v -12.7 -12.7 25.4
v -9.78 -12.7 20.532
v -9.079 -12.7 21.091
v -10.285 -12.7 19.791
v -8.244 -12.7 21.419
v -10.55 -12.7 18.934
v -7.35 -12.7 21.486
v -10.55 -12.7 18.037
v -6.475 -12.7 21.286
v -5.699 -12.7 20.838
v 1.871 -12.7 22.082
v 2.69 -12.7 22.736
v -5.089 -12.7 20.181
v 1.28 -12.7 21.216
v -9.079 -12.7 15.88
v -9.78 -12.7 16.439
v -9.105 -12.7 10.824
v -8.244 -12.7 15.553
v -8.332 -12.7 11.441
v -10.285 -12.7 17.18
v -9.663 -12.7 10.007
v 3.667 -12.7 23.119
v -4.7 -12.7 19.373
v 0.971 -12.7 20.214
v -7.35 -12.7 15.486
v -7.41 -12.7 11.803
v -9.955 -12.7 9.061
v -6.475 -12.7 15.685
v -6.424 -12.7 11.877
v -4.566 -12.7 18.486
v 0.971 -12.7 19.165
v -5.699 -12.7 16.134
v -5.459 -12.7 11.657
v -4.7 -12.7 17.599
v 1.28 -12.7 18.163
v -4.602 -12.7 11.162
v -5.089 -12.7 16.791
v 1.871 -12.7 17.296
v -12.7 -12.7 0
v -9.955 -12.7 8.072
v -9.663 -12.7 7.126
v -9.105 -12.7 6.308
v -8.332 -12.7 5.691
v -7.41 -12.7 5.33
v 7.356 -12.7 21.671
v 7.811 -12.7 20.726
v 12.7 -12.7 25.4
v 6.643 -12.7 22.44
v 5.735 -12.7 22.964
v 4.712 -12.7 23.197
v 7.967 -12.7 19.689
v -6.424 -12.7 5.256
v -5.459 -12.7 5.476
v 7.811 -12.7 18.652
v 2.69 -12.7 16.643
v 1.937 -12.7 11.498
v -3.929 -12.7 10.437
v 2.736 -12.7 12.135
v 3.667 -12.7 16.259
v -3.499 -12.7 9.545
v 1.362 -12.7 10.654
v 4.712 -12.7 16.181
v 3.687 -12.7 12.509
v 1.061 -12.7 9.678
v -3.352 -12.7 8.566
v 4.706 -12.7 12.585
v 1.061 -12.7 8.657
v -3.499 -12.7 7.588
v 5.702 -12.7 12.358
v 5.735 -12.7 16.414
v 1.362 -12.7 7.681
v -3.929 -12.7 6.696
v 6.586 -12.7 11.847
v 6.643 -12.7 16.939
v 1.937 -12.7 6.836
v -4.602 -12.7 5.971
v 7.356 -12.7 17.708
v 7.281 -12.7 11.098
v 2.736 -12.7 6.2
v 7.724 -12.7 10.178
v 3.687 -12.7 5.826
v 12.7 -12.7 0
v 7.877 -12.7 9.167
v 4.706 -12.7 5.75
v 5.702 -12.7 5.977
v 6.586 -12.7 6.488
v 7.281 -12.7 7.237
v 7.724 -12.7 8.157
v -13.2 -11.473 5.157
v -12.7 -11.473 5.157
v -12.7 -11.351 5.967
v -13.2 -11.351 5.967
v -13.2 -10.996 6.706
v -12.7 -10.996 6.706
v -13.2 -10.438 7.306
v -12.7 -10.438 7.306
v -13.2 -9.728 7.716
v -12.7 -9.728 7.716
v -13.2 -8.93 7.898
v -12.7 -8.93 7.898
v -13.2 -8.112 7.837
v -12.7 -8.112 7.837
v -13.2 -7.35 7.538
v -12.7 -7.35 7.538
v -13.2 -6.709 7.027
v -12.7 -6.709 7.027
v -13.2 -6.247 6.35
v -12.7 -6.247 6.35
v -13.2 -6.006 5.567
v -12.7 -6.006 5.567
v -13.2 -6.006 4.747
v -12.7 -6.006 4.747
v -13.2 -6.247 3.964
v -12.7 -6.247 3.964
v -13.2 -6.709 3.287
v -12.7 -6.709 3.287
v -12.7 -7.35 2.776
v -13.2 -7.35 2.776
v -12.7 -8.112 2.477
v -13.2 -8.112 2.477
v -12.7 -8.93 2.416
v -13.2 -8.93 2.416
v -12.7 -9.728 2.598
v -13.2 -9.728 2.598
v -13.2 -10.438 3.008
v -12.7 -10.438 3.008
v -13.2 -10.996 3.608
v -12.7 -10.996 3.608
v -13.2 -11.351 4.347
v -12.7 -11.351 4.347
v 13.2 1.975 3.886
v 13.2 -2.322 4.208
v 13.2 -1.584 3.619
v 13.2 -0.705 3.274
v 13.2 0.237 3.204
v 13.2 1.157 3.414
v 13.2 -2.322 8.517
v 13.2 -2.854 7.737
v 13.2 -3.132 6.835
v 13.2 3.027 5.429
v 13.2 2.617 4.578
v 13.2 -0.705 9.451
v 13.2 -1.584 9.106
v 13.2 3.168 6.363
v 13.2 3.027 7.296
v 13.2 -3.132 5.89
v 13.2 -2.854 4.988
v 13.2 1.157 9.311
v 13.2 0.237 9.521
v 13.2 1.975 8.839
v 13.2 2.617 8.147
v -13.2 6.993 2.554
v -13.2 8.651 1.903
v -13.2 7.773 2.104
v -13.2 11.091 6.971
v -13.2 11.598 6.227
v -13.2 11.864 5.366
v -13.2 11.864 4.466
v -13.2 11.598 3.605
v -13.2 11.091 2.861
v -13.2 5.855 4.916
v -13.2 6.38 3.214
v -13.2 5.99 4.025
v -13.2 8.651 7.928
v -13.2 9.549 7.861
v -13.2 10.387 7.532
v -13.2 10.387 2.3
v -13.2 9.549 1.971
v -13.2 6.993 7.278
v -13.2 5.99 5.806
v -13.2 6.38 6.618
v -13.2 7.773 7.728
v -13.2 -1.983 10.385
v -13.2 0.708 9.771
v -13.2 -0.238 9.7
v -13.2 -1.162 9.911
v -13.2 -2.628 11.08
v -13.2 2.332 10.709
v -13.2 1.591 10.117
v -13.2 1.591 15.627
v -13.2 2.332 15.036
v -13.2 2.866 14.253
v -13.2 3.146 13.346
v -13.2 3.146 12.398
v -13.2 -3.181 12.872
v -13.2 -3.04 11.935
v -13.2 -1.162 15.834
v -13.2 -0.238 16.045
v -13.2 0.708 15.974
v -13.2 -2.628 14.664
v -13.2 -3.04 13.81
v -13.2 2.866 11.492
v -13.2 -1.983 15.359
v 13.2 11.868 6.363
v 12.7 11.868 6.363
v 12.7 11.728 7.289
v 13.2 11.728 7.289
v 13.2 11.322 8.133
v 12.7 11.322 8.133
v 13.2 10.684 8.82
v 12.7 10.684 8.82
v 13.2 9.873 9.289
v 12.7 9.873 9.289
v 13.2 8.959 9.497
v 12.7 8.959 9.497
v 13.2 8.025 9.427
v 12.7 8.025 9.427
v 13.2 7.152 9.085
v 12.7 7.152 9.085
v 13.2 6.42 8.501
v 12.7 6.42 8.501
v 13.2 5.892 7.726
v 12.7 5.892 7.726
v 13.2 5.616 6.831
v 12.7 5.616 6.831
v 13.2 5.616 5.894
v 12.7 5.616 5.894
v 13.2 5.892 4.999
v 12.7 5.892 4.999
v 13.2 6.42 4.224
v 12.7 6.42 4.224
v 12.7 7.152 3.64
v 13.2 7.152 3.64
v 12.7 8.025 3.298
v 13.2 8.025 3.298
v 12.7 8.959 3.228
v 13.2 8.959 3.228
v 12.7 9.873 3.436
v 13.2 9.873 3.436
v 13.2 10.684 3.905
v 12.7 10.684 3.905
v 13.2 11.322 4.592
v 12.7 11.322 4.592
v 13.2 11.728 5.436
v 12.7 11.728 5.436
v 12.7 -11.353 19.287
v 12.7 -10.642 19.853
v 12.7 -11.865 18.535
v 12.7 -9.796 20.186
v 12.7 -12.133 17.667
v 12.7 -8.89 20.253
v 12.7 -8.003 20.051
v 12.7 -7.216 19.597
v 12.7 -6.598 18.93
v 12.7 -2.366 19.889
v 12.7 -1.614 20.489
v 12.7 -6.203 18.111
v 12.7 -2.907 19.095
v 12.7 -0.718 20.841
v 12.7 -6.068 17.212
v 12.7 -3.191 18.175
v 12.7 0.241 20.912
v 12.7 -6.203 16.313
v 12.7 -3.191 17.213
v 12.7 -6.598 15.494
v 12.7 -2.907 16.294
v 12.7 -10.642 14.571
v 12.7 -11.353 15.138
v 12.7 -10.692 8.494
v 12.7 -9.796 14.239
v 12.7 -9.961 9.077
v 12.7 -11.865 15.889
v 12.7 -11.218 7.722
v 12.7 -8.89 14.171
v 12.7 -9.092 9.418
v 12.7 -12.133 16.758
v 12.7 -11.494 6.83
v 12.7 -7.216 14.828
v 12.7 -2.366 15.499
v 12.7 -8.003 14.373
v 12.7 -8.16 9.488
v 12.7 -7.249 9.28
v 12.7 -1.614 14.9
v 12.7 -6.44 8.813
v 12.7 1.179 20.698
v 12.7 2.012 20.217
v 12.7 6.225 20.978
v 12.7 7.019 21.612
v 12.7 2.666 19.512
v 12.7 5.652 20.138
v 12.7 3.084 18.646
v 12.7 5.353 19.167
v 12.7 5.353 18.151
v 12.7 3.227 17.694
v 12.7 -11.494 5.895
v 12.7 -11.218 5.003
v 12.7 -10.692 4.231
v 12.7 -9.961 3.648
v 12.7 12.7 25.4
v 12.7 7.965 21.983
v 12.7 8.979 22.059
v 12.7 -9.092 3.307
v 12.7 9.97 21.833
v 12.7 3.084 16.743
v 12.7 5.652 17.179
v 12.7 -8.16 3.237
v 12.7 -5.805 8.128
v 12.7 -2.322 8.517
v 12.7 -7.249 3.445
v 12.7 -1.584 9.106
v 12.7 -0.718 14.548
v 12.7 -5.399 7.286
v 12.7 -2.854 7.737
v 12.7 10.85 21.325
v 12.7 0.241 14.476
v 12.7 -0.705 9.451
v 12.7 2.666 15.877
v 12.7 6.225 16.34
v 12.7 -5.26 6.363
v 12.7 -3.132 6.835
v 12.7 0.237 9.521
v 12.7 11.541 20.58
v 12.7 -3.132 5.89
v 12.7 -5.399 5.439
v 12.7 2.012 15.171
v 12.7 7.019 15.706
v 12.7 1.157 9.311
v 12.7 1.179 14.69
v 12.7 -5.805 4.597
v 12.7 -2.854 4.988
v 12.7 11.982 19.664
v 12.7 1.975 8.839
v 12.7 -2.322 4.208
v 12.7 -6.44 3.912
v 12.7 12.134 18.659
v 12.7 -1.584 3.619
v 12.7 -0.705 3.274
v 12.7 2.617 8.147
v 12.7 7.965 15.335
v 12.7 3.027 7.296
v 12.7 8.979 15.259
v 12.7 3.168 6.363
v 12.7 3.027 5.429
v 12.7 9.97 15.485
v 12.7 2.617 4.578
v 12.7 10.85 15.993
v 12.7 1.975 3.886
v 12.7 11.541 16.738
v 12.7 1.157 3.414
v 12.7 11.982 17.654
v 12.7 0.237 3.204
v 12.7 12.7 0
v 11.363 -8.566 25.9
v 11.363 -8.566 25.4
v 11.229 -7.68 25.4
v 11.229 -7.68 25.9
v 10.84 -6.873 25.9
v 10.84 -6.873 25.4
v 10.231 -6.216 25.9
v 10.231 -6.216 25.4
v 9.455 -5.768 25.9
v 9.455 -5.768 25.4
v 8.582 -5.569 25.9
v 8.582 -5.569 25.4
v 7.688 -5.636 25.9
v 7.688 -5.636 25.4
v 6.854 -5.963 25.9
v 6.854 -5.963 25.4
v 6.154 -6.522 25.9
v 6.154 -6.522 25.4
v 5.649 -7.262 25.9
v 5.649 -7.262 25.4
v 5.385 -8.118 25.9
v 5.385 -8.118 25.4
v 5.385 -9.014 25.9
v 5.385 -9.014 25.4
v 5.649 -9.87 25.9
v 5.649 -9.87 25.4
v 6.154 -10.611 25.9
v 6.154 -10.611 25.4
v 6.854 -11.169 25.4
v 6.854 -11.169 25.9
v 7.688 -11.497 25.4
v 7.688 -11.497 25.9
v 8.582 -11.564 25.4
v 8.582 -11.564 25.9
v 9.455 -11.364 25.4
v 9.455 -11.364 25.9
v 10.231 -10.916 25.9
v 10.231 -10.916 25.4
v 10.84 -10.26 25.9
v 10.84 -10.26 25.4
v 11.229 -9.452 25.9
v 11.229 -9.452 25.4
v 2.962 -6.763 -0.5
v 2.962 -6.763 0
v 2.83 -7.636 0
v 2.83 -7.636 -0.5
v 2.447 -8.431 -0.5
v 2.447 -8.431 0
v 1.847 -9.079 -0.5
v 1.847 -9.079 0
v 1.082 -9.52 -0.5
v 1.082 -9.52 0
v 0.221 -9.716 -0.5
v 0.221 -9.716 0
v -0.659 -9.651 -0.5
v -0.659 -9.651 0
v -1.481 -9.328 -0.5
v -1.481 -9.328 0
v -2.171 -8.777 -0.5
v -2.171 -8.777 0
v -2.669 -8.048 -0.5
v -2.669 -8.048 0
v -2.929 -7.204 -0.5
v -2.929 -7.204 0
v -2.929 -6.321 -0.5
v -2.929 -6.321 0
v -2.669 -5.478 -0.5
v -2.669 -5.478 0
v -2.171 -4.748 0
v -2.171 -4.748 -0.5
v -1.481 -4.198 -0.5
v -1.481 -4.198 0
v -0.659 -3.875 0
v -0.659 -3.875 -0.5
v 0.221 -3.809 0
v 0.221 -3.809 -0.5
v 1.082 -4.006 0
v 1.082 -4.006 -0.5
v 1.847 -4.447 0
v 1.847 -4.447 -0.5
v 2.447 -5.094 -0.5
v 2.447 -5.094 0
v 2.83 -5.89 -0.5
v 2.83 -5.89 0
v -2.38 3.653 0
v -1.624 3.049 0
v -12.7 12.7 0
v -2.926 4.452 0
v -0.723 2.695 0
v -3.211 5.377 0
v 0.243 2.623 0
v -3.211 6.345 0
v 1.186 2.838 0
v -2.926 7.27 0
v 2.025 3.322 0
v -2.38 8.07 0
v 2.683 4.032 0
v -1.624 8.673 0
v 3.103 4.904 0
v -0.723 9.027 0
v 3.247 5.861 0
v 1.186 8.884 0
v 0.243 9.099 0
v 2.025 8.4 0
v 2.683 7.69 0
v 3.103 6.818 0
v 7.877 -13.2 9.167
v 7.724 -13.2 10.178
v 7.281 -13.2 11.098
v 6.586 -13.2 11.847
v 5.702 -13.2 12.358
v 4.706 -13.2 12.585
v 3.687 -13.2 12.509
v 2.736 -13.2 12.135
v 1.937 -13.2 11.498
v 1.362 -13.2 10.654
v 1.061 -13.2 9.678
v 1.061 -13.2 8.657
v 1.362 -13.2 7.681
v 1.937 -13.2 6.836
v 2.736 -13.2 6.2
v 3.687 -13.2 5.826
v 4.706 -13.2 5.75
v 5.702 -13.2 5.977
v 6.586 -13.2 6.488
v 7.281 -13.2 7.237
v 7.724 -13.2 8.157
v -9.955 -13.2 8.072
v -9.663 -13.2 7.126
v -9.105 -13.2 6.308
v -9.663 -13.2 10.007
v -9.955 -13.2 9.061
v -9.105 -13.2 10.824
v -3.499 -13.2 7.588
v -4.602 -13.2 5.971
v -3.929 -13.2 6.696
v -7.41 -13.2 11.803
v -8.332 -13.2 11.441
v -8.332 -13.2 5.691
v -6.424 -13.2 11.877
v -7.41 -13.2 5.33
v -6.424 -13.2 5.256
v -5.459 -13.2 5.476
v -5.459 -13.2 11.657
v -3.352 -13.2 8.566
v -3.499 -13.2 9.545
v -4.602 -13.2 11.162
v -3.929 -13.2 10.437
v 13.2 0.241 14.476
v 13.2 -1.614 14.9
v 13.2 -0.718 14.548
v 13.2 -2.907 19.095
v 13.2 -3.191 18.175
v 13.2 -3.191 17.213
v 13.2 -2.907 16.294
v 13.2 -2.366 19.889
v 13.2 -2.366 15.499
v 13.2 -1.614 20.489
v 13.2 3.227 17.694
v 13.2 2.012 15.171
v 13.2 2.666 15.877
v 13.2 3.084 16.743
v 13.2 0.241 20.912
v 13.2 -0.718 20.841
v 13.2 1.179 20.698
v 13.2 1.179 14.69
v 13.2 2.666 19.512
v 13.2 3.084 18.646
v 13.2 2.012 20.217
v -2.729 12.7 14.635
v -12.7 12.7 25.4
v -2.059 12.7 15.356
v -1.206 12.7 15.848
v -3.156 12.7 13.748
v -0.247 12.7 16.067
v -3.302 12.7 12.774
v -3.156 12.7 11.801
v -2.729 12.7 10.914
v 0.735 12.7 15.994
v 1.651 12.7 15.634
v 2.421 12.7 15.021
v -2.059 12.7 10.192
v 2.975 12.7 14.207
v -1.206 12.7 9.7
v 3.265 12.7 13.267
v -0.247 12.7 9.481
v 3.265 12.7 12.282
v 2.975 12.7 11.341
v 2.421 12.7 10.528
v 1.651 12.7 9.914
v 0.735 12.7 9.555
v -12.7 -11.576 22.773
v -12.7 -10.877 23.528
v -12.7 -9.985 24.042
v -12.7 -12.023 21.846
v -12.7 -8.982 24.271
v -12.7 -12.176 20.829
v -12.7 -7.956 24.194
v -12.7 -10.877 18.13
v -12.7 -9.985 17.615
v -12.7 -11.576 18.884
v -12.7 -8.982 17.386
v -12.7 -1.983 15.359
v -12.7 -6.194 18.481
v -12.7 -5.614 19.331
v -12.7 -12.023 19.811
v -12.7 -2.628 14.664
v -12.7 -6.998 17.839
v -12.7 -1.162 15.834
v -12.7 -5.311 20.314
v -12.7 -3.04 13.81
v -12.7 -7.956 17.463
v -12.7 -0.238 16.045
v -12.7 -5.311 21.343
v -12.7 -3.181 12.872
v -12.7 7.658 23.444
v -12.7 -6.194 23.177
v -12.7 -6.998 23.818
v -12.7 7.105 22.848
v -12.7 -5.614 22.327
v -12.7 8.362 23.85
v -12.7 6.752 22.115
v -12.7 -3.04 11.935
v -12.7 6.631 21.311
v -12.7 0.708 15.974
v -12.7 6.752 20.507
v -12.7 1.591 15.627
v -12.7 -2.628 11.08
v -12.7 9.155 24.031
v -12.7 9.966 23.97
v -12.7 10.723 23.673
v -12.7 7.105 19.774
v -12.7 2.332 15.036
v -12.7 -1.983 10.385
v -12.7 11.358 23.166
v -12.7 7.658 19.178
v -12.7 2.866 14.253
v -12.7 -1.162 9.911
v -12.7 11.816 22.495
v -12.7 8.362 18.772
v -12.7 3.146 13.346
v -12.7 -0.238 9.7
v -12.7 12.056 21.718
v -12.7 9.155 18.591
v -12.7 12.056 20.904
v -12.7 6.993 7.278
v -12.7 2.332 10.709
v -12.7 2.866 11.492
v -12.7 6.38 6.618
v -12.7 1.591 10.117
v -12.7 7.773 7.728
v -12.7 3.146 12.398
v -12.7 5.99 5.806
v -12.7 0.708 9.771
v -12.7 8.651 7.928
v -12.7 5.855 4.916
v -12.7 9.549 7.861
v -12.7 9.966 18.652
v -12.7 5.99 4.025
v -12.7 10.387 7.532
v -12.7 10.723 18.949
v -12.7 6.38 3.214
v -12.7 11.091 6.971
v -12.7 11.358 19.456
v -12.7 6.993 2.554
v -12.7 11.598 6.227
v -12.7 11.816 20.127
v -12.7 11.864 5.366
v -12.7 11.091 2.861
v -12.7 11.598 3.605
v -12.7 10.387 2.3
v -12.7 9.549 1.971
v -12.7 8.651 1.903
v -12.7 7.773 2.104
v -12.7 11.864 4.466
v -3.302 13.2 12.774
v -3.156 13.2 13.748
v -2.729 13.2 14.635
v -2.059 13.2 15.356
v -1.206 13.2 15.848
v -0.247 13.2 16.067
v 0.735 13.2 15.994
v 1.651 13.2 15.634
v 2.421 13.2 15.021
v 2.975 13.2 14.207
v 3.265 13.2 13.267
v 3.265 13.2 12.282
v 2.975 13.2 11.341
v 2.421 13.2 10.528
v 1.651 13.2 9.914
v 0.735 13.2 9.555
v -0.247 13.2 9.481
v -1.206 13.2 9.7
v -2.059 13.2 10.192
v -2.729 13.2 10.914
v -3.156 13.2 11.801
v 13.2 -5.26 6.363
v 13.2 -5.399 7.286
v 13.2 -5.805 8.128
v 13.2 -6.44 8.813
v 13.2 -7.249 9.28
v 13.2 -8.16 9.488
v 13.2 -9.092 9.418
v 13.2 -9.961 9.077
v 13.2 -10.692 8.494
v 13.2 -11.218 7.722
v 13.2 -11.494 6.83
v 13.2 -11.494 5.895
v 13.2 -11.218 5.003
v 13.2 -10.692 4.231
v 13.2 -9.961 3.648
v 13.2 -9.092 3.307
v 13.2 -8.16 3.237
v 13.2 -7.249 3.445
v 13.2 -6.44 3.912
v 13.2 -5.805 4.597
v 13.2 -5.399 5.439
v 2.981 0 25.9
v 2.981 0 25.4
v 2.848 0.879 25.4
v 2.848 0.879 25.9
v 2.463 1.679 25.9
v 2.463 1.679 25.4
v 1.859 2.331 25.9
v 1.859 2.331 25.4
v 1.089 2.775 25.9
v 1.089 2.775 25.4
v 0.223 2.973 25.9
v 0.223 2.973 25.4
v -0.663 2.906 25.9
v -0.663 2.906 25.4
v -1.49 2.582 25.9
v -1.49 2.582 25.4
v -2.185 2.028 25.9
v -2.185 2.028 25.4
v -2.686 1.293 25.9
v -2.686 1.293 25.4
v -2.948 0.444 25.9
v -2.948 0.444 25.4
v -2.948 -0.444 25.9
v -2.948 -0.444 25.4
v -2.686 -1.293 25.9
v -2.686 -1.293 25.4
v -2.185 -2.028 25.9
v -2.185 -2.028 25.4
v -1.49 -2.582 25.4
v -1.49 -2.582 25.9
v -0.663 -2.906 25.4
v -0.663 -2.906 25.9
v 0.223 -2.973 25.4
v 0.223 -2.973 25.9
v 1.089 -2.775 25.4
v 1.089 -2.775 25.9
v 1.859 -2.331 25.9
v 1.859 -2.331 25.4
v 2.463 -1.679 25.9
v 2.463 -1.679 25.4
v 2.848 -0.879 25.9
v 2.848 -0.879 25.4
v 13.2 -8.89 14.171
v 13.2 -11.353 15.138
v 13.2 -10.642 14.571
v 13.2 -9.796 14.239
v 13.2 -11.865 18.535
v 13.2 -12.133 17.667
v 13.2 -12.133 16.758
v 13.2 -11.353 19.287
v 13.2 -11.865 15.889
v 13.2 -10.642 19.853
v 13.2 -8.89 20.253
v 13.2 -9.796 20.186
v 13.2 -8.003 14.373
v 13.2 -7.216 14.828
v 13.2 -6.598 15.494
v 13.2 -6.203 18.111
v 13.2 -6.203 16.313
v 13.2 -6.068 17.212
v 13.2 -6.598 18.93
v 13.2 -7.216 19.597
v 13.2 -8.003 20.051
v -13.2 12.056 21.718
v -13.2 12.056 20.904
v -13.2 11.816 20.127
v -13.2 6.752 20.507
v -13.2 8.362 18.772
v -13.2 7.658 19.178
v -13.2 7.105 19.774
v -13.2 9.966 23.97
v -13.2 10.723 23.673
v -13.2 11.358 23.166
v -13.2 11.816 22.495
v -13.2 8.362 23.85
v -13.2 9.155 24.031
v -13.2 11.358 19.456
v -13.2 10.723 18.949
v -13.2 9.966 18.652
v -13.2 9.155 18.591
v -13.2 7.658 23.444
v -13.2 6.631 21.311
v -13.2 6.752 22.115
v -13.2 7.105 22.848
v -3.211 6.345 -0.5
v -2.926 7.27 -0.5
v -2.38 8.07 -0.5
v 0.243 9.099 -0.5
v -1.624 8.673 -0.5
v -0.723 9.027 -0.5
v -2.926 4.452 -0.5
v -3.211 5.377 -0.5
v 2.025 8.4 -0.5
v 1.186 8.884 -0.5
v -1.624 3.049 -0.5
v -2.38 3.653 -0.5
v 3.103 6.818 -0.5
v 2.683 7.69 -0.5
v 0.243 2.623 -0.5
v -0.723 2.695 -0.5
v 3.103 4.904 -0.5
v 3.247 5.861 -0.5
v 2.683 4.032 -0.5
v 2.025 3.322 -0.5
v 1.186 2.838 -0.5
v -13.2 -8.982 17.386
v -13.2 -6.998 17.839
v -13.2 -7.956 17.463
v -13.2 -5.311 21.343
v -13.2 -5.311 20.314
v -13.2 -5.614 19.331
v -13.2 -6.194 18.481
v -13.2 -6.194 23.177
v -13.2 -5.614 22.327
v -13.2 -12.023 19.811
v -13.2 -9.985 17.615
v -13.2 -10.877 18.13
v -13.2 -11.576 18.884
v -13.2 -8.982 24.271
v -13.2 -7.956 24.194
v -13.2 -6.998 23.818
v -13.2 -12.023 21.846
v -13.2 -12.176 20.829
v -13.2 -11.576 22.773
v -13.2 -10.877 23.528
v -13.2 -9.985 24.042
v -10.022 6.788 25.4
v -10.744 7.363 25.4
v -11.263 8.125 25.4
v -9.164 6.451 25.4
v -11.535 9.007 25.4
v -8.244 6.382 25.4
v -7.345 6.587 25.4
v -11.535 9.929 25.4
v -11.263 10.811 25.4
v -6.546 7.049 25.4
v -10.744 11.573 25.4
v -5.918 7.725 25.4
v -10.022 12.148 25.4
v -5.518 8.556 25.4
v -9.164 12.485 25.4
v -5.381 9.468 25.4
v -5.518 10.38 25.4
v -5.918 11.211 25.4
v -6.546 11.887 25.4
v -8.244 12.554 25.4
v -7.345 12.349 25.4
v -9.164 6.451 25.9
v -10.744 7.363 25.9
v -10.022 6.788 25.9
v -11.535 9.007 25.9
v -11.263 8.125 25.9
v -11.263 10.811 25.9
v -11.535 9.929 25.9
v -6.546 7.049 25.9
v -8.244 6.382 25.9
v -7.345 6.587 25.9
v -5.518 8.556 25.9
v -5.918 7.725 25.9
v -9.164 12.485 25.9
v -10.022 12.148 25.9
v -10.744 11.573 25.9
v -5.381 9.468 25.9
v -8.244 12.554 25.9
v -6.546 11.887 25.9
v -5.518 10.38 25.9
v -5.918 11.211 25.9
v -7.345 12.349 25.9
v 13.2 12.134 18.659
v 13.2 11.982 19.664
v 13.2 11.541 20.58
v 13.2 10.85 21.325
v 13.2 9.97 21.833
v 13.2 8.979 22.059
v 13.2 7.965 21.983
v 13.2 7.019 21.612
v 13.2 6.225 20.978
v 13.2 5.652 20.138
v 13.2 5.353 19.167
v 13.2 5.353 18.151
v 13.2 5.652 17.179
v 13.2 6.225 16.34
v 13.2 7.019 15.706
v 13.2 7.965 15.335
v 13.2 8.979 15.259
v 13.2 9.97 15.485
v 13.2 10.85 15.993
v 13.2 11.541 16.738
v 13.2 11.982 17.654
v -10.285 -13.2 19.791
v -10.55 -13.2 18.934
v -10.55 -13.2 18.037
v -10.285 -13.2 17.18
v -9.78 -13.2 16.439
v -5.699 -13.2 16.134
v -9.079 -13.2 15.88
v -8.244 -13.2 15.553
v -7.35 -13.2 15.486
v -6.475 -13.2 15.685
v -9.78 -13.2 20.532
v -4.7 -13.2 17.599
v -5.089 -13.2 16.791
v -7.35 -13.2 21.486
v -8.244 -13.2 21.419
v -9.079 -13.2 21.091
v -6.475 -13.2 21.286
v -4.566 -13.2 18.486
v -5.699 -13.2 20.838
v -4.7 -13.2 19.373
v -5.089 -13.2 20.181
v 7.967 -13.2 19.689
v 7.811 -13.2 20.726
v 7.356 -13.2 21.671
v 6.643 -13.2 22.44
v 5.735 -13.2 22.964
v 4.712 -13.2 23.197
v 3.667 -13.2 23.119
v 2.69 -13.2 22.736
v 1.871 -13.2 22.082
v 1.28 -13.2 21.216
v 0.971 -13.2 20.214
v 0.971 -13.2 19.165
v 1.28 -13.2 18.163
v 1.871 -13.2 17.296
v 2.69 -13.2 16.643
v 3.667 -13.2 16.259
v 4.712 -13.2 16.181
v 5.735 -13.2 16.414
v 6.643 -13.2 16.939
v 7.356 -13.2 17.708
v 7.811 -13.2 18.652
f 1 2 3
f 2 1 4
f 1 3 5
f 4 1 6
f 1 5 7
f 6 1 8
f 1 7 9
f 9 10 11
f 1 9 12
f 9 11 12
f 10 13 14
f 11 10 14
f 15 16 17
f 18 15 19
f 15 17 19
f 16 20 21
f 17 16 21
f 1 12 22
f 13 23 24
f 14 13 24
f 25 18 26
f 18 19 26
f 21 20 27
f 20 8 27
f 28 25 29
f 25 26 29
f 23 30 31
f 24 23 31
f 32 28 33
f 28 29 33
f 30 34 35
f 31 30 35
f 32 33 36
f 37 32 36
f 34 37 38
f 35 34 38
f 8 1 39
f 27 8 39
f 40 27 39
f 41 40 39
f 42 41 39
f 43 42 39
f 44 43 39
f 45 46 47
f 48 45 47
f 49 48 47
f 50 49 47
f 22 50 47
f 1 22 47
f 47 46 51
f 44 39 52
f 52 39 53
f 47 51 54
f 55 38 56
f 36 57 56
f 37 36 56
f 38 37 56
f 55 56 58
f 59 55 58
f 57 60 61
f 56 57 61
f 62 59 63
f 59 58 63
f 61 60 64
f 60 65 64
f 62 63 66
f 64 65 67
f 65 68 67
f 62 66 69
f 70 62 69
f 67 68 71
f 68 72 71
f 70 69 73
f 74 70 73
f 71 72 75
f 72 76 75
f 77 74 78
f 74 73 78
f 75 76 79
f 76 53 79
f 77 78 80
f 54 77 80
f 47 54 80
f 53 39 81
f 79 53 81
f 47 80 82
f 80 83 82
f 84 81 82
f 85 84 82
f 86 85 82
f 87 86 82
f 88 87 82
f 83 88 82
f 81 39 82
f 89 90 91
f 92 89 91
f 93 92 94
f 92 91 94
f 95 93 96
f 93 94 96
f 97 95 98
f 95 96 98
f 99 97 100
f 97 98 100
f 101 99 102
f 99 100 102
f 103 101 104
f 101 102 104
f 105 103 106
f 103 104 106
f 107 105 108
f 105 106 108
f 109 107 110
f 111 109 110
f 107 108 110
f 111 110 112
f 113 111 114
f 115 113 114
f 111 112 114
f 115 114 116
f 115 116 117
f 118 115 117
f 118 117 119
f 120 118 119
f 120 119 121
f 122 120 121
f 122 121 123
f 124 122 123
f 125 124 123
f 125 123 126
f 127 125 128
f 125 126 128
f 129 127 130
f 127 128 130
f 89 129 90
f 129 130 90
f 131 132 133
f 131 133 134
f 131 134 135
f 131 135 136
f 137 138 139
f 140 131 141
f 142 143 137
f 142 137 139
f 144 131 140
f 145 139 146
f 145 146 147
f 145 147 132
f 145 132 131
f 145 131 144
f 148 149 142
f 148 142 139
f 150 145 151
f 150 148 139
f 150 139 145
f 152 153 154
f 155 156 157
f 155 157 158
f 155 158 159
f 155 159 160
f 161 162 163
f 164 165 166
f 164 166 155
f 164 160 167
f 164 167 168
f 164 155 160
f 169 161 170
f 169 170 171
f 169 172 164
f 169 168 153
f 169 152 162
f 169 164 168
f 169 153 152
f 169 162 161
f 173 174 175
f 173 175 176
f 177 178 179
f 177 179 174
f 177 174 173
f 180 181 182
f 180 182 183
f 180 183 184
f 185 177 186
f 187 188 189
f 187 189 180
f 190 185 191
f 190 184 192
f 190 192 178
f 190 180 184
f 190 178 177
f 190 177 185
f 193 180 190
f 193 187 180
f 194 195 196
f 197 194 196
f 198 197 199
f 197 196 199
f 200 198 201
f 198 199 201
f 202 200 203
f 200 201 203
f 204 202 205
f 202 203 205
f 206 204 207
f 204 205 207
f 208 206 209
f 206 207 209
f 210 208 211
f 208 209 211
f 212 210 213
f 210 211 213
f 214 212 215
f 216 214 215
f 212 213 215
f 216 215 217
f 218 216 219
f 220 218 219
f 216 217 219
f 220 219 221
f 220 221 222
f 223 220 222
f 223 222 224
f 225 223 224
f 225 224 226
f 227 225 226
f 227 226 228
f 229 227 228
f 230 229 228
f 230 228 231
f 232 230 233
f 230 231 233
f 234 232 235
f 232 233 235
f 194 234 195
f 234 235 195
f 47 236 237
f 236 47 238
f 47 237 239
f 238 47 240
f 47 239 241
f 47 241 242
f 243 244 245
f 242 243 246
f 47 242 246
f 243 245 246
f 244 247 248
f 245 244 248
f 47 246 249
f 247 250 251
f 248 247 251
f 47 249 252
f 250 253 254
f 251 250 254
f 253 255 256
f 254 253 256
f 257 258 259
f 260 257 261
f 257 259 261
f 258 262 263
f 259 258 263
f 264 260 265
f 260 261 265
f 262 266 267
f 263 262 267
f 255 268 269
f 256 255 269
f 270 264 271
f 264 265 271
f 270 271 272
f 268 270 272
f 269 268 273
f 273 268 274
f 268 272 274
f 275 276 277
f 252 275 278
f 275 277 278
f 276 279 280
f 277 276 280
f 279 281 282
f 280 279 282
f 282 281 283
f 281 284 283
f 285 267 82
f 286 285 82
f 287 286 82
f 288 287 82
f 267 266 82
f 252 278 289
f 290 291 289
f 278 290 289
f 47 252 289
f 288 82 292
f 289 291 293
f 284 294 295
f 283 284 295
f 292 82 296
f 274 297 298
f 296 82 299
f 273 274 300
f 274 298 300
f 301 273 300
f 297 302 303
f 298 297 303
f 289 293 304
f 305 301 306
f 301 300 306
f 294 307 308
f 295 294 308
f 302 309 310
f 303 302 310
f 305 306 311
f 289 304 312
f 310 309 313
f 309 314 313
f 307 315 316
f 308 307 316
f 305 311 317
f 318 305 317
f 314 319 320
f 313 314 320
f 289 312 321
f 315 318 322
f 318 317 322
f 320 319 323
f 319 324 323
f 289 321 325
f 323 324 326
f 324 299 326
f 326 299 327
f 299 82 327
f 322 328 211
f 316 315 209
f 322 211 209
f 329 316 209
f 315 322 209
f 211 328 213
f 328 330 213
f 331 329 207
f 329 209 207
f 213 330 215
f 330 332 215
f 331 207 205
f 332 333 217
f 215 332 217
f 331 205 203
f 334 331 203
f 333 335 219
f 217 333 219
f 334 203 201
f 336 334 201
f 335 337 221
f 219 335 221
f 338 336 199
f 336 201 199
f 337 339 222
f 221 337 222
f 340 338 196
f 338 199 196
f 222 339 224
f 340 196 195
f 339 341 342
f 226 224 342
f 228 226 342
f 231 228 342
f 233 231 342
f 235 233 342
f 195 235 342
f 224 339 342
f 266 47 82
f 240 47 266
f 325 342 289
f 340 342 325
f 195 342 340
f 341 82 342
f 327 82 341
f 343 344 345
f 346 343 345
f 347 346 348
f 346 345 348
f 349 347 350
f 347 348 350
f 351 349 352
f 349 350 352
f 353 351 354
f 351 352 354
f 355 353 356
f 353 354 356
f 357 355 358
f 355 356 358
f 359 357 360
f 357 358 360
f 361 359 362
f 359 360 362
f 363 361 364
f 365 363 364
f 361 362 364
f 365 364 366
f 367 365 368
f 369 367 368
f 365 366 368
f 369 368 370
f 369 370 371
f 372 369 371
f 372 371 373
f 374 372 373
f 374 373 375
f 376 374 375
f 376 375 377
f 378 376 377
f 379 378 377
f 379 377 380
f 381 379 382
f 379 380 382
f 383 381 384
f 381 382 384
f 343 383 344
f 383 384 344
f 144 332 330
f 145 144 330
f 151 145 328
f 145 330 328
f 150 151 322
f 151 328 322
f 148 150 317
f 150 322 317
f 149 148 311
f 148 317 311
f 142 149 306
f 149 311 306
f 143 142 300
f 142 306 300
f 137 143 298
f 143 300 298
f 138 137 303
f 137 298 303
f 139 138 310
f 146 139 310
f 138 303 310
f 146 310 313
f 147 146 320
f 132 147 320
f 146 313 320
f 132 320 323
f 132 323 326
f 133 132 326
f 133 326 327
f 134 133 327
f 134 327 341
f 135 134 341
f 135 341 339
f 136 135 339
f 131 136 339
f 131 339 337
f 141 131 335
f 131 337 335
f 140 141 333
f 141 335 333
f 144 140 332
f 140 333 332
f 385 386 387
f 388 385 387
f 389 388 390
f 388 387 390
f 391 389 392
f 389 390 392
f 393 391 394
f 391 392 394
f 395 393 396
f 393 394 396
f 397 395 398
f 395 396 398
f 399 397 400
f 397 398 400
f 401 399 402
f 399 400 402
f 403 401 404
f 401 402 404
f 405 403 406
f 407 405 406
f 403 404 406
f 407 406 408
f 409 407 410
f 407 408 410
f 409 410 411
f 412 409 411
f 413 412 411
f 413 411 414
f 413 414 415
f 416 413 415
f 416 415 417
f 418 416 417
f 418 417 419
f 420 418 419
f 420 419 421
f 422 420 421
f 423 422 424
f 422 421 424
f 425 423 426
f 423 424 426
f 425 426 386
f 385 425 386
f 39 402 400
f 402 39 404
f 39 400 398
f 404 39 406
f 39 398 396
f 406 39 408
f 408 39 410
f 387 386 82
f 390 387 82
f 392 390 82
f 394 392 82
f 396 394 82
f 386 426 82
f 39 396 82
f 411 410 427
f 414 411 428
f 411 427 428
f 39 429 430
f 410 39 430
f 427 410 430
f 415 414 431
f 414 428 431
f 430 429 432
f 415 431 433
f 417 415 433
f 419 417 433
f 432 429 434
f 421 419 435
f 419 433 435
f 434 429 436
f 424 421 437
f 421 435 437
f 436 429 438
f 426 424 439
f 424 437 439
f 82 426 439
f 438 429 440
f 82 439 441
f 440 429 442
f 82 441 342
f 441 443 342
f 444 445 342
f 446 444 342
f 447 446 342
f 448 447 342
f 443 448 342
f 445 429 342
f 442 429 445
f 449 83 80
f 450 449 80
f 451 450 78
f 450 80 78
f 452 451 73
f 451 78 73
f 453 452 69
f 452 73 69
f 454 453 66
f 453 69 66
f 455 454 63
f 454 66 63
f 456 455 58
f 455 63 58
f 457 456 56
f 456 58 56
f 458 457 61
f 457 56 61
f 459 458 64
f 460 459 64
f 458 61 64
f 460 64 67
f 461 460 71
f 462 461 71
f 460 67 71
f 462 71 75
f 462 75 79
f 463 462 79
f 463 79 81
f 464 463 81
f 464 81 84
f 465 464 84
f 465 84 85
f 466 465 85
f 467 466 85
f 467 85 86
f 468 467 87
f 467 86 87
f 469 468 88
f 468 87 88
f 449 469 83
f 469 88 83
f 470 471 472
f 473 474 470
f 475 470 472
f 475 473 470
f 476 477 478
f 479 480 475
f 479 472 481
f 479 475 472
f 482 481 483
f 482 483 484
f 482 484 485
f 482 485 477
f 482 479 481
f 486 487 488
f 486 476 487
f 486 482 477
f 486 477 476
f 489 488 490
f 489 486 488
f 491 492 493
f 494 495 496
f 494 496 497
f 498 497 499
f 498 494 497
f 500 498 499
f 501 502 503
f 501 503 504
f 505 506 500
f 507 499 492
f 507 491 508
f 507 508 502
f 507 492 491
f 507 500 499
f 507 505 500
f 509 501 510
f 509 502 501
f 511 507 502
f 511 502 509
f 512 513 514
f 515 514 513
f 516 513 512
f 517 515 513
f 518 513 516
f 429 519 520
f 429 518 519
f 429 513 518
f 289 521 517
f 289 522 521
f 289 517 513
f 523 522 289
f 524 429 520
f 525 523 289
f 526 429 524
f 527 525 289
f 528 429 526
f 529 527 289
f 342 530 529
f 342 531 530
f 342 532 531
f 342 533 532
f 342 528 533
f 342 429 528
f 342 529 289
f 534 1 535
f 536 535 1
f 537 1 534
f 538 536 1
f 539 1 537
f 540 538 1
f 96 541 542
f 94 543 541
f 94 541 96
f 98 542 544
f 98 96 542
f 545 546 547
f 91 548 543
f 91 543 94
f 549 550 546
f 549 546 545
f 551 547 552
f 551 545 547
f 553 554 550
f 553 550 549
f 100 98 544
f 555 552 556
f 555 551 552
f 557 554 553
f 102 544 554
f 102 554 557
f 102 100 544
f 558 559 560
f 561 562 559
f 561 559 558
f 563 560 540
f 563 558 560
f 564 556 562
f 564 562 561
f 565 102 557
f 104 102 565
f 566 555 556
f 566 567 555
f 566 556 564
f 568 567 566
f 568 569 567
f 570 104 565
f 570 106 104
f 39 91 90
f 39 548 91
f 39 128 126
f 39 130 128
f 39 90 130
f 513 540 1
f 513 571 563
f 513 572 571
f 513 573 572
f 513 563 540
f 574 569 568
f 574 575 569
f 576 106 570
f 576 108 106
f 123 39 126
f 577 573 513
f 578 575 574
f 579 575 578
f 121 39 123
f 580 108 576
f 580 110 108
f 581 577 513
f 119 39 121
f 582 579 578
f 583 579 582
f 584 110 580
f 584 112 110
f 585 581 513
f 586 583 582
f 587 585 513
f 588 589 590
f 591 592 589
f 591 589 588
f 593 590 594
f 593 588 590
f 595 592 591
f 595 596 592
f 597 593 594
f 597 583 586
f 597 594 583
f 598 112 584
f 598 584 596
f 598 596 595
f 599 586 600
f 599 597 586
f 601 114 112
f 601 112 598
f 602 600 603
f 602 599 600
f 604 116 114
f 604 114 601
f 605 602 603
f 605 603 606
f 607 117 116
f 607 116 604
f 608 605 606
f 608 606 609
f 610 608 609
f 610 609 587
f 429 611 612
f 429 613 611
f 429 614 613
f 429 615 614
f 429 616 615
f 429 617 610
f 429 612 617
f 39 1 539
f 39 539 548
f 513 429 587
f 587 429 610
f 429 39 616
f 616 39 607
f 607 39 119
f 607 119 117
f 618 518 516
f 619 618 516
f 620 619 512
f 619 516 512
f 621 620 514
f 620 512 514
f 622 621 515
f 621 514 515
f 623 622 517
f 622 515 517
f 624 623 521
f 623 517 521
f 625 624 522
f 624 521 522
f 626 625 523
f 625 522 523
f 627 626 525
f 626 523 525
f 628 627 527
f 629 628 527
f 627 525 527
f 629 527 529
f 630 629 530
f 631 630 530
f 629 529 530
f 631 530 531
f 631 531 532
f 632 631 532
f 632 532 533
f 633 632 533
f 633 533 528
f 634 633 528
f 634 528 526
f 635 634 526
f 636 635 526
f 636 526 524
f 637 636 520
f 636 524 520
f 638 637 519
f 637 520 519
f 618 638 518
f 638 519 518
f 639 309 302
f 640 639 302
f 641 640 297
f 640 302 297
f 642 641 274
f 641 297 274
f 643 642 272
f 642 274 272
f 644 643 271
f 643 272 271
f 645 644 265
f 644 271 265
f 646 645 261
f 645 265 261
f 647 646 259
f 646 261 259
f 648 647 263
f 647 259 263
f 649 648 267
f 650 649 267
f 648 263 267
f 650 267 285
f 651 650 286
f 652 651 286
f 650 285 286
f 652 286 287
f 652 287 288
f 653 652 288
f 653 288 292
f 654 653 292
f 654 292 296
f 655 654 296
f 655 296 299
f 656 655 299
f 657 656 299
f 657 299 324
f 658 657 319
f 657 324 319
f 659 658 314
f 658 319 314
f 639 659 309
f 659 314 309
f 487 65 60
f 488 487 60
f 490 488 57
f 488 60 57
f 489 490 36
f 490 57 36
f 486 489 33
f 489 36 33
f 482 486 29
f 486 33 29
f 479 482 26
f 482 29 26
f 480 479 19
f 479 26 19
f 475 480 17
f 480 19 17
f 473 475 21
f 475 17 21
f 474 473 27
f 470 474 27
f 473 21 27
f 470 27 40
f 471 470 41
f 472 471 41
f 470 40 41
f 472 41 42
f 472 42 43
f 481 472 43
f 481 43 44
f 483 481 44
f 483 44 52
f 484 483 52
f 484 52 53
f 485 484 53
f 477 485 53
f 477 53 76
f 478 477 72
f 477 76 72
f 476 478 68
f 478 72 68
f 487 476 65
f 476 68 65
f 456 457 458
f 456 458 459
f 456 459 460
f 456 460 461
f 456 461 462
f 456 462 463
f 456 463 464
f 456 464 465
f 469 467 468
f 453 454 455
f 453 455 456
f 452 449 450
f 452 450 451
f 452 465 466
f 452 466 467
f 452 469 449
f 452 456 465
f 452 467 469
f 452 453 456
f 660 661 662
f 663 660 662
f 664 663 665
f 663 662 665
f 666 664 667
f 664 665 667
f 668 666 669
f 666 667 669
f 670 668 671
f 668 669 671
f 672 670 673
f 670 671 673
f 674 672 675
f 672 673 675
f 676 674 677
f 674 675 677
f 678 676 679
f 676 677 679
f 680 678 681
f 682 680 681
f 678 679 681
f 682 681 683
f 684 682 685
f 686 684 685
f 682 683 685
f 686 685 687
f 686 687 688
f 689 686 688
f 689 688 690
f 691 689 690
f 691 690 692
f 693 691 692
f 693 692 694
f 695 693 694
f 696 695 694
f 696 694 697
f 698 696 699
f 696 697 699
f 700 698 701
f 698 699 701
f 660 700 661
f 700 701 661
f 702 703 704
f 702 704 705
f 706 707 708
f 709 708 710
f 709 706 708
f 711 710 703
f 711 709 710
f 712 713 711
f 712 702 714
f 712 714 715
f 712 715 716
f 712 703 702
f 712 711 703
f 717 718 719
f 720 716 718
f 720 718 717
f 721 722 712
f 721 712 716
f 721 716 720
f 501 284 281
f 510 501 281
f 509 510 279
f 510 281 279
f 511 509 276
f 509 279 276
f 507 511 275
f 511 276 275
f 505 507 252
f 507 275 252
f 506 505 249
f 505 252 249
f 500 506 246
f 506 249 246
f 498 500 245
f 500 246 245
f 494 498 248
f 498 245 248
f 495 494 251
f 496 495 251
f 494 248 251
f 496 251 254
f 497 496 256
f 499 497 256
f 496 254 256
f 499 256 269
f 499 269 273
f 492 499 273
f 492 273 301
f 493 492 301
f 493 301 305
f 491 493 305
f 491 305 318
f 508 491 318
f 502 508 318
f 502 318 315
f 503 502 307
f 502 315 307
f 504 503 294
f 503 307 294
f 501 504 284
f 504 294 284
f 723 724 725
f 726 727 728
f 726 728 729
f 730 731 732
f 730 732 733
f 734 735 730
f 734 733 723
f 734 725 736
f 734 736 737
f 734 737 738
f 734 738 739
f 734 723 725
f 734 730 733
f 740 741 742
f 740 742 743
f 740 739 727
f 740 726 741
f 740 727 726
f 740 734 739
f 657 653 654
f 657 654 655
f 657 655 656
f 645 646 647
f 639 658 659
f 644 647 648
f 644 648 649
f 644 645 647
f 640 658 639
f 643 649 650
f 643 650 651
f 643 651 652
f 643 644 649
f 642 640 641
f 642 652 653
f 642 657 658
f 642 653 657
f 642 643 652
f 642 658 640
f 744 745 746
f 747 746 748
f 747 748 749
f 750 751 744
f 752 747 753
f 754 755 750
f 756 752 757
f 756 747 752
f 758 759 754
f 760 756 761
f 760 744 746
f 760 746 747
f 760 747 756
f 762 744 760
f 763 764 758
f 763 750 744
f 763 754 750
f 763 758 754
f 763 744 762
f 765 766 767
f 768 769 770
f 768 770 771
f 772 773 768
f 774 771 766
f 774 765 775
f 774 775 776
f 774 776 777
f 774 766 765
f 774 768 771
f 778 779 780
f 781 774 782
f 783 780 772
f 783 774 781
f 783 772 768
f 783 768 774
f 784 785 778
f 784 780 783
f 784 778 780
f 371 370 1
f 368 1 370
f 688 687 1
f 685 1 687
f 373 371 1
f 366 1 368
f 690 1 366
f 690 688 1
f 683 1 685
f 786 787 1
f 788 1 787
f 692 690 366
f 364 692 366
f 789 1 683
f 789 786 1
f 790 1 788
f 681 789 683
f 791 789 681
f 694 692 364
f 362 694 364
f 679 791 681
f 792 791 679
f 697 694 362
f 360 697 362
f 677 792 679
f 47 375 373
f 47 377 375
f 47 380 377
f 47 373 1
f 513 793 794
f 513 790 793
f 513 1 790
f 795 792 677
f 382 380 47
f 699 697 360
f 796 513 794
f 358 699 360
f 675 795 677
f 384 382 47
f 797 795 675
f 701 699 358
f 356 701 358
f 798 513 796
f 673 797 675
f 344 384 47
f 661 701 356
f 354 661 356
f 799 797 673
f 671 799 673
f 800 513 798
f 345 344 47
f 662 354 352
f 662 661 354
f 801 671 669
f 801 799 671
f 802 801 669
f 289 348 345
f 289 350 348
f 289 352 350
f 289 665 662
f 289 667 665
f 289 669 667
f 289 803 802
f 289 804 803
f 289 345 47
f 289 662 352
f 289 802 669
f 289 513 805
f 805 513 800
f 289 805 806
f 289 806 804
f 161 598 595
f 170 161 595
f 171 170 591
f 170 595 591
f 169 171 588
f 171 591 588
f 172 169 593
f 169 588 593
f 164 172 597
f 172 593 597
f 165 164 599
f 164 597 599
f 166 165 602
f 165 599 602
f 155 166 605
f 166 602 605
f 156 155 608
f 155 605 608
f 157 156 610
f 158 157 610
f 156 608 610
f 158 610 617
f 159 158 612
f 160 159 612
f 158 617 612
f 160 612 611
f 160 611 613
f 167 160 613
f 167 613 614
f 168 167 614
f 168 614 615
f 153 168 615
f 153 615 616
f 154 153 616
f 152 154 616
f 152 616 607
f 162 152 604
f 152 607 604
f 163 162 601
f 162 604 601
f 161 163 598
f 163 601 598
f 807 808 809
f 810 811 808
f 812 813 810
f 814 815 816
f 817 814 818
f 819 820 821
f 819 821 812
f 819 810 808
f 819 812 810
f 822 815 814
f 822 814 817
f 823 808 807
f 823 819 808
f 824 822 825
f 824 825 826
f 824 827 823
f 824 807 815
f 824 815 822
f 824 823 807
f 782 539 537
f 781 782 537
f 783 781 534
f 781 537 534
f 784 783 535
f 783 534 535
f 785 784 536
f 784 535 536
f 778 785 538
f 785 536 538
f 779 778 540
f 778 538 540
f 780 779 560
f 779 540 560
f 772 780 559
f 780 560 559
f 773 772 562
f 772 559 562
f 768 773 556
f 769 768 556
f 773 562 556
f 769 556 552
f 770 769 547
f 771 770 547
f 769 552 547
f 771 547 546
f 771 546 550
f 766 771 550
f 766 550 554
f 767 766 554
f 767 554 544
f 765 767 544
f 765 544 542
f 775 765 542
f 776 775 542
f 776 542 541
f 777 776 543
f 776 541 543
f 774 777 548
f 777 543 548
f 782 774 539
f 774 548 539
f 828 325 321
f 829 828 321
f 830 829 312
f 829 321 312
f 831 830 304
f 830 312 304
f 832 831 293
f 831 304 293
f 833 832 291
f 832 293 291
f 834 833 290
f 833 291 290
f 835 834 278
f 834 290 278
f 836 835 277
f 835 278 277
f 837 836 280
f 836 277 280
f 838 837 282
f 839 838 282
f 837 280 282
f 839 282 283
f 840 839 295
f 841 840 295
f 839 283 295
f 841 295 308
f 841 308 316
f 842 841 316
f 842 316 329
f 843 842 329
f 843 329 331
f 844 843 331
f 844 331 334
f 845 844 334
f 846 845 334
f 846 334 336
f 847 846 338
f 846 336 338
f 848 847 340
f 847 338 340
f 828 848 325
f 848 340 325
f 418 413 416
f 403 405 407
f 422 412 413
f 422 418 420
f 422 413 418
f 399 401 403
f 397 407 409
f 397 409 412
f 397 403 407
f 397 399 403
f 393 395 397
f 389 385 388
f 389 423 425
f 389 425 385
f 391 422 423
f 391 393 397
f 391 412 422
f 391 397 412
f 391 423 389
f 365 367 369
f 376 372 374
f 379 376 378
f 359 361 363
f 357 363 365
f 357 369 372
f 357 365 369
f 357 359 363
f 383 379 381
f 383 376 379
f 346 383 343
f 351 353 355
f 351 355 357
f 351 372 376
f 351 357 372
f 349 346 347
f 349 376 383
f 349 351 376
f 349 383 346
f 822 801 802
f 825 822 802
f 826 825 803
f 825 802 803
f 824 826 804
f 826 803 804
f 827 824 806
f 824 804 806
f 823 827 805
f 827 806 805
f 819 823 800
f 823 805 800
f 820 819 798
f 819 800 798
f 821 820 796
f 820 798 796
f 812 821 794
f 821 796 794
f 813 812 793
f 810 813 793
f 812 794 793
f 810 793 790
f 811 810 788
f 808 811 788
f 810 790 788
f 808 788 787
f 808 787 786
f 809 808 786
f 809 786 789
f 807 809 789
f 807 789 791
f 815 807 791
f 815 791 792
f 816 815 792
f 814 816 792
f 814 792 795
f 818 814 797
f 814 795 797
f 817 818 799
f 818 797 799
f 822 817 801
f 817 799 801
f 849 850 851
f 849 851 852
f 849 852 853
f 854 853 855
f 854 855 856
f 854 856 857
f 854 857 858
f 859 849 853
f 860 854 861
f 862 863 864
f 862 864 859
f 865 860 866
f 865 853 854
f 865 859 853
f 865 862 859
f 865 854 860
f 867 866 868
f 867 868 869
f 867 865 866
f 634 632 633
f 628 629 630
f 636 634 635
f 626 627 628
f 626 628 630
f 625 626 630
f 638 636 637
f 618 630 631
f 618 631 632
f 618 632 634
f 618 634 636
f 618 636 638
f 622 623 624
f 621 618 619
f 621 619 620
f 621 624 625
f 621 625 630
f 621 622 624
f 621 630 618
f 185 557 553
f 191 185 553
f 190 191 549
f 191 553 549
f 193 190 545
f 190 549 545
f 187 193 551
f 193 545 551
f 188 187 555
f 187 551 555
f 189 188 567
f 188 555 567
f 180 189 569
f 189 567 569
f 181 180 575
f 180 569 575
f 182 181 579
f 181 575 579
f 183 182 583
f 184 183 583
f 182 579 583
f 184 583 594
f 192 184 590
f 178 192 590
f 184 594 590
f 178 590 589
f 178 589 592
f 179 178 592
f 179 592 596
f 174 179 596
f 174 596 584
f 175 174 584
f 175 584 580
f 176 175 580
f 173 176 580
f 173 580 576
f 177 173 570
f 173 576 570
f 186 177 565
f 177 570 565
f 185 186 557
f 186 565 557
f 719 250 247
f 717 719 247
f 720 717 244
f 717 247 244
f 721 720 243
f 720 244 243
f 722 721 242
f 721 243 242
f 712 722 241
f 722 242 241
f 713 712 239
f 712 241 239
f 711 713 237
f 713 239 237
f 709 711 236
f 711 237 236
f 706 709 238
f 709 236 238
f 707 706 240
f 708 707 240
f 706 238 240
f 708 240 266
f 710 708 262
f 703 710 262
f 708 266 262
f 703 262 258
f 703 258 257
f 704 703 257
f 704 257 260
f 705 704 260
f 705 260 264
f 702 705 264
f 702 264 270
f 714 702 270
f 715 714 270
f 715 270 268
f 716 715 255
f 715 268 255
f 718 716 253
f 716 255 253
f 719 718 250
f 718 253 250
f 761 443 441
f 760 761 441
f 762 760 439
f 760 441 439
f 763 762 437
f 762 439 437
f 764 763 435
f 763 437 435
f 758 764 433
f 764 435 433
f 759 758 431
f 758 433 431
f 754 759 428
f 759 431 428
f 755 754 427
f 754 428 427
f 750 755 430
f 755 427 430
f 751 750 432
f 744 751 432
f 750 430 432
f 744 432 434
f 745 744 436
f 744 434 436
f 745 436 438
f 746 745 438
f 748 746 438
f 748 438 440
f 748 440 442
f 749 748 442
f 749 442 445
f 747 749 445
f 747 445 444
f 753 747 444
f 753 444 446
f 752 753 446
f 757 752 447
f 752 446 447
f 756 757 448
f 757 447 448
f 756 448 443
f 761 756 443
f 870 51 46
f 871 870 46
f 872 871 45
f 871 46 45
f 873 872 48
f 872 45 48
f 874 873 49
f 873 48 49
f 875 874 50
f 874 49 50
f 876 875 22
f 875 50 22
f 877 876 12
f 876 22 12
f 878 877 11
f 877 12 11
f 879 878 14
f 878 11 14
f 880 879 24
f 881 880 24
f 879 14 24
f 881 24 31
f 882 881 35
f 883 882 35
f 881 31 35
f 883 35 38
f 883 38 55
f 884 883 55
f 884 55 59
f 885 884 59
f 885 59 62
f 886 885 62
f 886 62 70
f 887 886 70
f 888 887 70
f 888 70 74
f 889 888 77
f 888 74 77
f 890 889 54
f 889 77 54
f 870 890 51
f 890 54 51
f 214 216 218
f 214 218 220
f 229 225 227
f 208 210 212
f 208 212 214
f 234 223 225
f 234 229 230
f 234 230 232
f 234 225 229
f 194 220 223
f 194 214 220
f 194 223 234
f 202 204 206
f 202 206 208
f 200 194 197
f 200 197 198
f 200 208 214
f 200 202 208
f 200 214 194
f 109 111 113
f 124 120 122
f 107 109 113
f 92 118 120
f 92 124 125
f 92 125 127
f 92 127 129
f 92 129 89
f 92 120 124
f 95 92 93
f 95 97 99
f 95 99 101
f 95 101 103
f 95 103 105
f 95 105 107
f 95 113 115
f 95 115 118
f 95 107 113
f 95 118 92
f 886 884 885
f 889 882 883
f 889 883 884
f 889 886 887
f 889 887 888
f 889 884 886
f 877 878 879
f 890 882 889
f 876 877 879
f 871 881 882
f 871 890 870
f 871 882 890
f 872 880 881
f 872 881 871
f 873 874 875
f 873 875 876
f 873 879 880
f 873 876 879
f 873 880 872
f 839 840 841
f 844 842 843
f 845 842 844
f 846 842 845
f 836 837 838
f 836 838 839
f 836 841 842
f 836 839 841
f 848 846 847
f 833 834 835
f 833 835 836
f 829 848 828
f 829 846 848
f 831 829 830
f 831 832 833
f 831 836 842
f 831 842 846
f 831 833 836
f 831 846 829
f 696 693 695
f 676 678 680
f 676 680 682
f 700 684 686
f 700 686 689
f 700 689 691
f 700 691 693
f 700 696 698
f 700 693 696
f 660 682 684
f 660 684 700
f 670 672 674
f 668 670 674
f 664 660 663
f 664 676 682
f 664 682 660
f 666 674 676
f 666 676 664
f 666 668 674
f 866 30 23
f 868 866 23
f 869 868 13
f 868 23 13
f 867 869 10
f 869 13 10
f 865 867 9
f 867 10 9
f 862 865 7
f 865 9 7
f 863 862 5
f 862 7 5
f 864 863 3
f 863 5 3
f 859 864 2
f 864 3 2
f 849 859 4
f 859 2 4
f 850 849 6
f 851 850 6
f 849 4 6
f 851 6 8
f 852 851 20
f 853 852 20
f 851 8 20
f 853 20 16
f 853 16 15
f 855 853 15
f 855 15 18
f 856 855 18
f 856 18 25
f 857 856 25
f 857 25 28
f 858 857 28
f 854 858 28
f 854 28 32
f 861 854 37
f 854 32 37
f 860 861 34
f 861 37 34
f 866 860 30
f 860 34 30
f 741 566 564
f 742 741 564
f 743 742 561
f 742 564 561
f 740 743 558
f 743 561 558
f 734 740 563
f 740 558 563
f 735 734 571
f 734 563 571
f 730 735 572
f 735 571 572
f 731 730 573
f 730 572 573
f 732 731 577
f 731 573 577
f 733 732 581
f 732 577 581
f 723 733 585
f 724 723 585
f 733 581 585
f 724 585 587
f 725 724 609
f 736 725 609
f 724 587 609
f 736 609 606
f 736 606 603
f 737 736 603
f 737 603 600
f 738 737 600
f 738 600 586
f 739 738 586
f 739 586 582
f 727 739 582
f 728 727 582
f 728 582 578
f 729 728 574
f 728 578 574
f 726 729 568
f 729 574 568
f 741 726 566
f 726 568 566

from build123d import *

# Parameters (mm, degrees)
F0_W      = 25.4
F0_H      = 25.4
F1_DEPTH  = 25.4
F2_R      = 3.302351
F3_DEPTH  = 0.5
F4_R      = 3.247176
F4_R_2    = 2.961893
F5_DEPTH  = 0.5
F6_R      = 3.005725
F6_R_2    = 2.980897
F6_R_3    = 3.094584
F7_DEPTH  = 0.5
F8_R      = 3.319933
F8_R_2    = 3.427054
F8_R_3    = 3.00862
F8_R_4    = 3.51795
F9_DEPTH  = 0.5
F10_R     = 3.021029
F10_R_2   = 3.181176
F10_R_3   = 2.727784
F10_R_4   = 3.452089
F10_R_5   = 2.749013
F11_DEPTH = 0.5
F12_R     = 3.134358
F12_R_2   = 3.167686
F12_R_3   = 3.143619
F12_R_4   = 3.049756
F12_R_5   = 3.227009
F12_R_6   = 3.40973
F13_DEPTH = 0.5


with BuildPart() as f1:
    # F0 (on Top) → F1 (new body)
    with BuildSketch(Plane.XY):
        Rectangle(F0_W, F0_H)
    extrude(amount=F1_DEPTH)

    # F2 (on face) → F3 (join)
    with BuildSketch(Plane(origin=(0, 12.7, 0), x_dir=(-1, 0, 0), z_dir=(0, 1, 0))):
        with Locations((0, 12.774332)):
            Circle(F2_R)
    extrude(amount=F3_DEPTH)

    # F4 (on face) → F5 (join)
    with BuildSketch(Plane(origin=(0, 0, 0), x_dir=(1, 0, 0), z_dir=(0, 0, -1))):
        with Locations((0, -5.861166)):
            Circle(F4_R)
        with Locations((0, 6.762884)):
            Circle(F4_R_2)
    extrude(amount=F5_DEPTH)

    # F6 (on face) → F7 (join)
    with BuildSketch(Plane.XY.offset(25.4)):
        with Locations((8.356908, -8.566318)):
            Circle(F6_R)
        Circle(F6_R_2)
        with Locations((-8.475154, 9.468036)):
            Circle(F6_R_3)
    extrude(amount=F7_DEPTH)

    # F8 (on face) → F9 (join)
    with BuildSketch(Plane.XZ.offset(12.7)):
        with Locations((-6.671718, 8.566318)):
            Circle(F8_R)
        with Locations((4.449466, 9.167464)):
            Circle(F8_R_2)
        with Locations((-7.574594, 18.485788)):
            Circle(F8_R_3)
        with Locations((4.449466, 19.689236)):
            Circle(F8_R_4)
    extrude(amount=F9_DEPTH)

    # F10 (on face) → F11 (join)
    with BuildSketch(Plane(origin=(-12.7, 0, 0), x_dir=(0, -1, 0), z_dir=(-1, 0, 0))):
        with Locations((-8.876446, 4.915892)):
            Circle(F10_R)
        with Locations((0, 12.872338)):
            Circle(F10_R_2)
        with Locations((-9.358654, 21.310989)):
            Circle(F10_R_3)
        with Locations((8.724171, 20.82878)):
            Circle(F10_R_4)
        with Locations((8.724171, 5.156996)):
            Circle(F10_R_5)
    extrude(amount=F11_DEPTH)

    # F12 (on face) → F13 (join)
    with BuildSketch(Plane.YZ.offset(12.7)):
        with Locations((-8.394237, 6.362522)):
            Circle(F12_R)
        with Locations((0, 6.362522)):
            Circle(F12_R_2)
        with Locations((8.724171, 6.362522)):
            Circle(F12_R_3)
        with Locations((-9.11755, 17.212216)):
            Circle(F12_R_4)
        with Locations((0, 17.694423)):
            Circle(F12_R_5)
        with Locations((8.724171, 18.658841)):
            Circle(F12_R_6)
    extrude(amount=F13_DEPTH)


solid = f1.part
